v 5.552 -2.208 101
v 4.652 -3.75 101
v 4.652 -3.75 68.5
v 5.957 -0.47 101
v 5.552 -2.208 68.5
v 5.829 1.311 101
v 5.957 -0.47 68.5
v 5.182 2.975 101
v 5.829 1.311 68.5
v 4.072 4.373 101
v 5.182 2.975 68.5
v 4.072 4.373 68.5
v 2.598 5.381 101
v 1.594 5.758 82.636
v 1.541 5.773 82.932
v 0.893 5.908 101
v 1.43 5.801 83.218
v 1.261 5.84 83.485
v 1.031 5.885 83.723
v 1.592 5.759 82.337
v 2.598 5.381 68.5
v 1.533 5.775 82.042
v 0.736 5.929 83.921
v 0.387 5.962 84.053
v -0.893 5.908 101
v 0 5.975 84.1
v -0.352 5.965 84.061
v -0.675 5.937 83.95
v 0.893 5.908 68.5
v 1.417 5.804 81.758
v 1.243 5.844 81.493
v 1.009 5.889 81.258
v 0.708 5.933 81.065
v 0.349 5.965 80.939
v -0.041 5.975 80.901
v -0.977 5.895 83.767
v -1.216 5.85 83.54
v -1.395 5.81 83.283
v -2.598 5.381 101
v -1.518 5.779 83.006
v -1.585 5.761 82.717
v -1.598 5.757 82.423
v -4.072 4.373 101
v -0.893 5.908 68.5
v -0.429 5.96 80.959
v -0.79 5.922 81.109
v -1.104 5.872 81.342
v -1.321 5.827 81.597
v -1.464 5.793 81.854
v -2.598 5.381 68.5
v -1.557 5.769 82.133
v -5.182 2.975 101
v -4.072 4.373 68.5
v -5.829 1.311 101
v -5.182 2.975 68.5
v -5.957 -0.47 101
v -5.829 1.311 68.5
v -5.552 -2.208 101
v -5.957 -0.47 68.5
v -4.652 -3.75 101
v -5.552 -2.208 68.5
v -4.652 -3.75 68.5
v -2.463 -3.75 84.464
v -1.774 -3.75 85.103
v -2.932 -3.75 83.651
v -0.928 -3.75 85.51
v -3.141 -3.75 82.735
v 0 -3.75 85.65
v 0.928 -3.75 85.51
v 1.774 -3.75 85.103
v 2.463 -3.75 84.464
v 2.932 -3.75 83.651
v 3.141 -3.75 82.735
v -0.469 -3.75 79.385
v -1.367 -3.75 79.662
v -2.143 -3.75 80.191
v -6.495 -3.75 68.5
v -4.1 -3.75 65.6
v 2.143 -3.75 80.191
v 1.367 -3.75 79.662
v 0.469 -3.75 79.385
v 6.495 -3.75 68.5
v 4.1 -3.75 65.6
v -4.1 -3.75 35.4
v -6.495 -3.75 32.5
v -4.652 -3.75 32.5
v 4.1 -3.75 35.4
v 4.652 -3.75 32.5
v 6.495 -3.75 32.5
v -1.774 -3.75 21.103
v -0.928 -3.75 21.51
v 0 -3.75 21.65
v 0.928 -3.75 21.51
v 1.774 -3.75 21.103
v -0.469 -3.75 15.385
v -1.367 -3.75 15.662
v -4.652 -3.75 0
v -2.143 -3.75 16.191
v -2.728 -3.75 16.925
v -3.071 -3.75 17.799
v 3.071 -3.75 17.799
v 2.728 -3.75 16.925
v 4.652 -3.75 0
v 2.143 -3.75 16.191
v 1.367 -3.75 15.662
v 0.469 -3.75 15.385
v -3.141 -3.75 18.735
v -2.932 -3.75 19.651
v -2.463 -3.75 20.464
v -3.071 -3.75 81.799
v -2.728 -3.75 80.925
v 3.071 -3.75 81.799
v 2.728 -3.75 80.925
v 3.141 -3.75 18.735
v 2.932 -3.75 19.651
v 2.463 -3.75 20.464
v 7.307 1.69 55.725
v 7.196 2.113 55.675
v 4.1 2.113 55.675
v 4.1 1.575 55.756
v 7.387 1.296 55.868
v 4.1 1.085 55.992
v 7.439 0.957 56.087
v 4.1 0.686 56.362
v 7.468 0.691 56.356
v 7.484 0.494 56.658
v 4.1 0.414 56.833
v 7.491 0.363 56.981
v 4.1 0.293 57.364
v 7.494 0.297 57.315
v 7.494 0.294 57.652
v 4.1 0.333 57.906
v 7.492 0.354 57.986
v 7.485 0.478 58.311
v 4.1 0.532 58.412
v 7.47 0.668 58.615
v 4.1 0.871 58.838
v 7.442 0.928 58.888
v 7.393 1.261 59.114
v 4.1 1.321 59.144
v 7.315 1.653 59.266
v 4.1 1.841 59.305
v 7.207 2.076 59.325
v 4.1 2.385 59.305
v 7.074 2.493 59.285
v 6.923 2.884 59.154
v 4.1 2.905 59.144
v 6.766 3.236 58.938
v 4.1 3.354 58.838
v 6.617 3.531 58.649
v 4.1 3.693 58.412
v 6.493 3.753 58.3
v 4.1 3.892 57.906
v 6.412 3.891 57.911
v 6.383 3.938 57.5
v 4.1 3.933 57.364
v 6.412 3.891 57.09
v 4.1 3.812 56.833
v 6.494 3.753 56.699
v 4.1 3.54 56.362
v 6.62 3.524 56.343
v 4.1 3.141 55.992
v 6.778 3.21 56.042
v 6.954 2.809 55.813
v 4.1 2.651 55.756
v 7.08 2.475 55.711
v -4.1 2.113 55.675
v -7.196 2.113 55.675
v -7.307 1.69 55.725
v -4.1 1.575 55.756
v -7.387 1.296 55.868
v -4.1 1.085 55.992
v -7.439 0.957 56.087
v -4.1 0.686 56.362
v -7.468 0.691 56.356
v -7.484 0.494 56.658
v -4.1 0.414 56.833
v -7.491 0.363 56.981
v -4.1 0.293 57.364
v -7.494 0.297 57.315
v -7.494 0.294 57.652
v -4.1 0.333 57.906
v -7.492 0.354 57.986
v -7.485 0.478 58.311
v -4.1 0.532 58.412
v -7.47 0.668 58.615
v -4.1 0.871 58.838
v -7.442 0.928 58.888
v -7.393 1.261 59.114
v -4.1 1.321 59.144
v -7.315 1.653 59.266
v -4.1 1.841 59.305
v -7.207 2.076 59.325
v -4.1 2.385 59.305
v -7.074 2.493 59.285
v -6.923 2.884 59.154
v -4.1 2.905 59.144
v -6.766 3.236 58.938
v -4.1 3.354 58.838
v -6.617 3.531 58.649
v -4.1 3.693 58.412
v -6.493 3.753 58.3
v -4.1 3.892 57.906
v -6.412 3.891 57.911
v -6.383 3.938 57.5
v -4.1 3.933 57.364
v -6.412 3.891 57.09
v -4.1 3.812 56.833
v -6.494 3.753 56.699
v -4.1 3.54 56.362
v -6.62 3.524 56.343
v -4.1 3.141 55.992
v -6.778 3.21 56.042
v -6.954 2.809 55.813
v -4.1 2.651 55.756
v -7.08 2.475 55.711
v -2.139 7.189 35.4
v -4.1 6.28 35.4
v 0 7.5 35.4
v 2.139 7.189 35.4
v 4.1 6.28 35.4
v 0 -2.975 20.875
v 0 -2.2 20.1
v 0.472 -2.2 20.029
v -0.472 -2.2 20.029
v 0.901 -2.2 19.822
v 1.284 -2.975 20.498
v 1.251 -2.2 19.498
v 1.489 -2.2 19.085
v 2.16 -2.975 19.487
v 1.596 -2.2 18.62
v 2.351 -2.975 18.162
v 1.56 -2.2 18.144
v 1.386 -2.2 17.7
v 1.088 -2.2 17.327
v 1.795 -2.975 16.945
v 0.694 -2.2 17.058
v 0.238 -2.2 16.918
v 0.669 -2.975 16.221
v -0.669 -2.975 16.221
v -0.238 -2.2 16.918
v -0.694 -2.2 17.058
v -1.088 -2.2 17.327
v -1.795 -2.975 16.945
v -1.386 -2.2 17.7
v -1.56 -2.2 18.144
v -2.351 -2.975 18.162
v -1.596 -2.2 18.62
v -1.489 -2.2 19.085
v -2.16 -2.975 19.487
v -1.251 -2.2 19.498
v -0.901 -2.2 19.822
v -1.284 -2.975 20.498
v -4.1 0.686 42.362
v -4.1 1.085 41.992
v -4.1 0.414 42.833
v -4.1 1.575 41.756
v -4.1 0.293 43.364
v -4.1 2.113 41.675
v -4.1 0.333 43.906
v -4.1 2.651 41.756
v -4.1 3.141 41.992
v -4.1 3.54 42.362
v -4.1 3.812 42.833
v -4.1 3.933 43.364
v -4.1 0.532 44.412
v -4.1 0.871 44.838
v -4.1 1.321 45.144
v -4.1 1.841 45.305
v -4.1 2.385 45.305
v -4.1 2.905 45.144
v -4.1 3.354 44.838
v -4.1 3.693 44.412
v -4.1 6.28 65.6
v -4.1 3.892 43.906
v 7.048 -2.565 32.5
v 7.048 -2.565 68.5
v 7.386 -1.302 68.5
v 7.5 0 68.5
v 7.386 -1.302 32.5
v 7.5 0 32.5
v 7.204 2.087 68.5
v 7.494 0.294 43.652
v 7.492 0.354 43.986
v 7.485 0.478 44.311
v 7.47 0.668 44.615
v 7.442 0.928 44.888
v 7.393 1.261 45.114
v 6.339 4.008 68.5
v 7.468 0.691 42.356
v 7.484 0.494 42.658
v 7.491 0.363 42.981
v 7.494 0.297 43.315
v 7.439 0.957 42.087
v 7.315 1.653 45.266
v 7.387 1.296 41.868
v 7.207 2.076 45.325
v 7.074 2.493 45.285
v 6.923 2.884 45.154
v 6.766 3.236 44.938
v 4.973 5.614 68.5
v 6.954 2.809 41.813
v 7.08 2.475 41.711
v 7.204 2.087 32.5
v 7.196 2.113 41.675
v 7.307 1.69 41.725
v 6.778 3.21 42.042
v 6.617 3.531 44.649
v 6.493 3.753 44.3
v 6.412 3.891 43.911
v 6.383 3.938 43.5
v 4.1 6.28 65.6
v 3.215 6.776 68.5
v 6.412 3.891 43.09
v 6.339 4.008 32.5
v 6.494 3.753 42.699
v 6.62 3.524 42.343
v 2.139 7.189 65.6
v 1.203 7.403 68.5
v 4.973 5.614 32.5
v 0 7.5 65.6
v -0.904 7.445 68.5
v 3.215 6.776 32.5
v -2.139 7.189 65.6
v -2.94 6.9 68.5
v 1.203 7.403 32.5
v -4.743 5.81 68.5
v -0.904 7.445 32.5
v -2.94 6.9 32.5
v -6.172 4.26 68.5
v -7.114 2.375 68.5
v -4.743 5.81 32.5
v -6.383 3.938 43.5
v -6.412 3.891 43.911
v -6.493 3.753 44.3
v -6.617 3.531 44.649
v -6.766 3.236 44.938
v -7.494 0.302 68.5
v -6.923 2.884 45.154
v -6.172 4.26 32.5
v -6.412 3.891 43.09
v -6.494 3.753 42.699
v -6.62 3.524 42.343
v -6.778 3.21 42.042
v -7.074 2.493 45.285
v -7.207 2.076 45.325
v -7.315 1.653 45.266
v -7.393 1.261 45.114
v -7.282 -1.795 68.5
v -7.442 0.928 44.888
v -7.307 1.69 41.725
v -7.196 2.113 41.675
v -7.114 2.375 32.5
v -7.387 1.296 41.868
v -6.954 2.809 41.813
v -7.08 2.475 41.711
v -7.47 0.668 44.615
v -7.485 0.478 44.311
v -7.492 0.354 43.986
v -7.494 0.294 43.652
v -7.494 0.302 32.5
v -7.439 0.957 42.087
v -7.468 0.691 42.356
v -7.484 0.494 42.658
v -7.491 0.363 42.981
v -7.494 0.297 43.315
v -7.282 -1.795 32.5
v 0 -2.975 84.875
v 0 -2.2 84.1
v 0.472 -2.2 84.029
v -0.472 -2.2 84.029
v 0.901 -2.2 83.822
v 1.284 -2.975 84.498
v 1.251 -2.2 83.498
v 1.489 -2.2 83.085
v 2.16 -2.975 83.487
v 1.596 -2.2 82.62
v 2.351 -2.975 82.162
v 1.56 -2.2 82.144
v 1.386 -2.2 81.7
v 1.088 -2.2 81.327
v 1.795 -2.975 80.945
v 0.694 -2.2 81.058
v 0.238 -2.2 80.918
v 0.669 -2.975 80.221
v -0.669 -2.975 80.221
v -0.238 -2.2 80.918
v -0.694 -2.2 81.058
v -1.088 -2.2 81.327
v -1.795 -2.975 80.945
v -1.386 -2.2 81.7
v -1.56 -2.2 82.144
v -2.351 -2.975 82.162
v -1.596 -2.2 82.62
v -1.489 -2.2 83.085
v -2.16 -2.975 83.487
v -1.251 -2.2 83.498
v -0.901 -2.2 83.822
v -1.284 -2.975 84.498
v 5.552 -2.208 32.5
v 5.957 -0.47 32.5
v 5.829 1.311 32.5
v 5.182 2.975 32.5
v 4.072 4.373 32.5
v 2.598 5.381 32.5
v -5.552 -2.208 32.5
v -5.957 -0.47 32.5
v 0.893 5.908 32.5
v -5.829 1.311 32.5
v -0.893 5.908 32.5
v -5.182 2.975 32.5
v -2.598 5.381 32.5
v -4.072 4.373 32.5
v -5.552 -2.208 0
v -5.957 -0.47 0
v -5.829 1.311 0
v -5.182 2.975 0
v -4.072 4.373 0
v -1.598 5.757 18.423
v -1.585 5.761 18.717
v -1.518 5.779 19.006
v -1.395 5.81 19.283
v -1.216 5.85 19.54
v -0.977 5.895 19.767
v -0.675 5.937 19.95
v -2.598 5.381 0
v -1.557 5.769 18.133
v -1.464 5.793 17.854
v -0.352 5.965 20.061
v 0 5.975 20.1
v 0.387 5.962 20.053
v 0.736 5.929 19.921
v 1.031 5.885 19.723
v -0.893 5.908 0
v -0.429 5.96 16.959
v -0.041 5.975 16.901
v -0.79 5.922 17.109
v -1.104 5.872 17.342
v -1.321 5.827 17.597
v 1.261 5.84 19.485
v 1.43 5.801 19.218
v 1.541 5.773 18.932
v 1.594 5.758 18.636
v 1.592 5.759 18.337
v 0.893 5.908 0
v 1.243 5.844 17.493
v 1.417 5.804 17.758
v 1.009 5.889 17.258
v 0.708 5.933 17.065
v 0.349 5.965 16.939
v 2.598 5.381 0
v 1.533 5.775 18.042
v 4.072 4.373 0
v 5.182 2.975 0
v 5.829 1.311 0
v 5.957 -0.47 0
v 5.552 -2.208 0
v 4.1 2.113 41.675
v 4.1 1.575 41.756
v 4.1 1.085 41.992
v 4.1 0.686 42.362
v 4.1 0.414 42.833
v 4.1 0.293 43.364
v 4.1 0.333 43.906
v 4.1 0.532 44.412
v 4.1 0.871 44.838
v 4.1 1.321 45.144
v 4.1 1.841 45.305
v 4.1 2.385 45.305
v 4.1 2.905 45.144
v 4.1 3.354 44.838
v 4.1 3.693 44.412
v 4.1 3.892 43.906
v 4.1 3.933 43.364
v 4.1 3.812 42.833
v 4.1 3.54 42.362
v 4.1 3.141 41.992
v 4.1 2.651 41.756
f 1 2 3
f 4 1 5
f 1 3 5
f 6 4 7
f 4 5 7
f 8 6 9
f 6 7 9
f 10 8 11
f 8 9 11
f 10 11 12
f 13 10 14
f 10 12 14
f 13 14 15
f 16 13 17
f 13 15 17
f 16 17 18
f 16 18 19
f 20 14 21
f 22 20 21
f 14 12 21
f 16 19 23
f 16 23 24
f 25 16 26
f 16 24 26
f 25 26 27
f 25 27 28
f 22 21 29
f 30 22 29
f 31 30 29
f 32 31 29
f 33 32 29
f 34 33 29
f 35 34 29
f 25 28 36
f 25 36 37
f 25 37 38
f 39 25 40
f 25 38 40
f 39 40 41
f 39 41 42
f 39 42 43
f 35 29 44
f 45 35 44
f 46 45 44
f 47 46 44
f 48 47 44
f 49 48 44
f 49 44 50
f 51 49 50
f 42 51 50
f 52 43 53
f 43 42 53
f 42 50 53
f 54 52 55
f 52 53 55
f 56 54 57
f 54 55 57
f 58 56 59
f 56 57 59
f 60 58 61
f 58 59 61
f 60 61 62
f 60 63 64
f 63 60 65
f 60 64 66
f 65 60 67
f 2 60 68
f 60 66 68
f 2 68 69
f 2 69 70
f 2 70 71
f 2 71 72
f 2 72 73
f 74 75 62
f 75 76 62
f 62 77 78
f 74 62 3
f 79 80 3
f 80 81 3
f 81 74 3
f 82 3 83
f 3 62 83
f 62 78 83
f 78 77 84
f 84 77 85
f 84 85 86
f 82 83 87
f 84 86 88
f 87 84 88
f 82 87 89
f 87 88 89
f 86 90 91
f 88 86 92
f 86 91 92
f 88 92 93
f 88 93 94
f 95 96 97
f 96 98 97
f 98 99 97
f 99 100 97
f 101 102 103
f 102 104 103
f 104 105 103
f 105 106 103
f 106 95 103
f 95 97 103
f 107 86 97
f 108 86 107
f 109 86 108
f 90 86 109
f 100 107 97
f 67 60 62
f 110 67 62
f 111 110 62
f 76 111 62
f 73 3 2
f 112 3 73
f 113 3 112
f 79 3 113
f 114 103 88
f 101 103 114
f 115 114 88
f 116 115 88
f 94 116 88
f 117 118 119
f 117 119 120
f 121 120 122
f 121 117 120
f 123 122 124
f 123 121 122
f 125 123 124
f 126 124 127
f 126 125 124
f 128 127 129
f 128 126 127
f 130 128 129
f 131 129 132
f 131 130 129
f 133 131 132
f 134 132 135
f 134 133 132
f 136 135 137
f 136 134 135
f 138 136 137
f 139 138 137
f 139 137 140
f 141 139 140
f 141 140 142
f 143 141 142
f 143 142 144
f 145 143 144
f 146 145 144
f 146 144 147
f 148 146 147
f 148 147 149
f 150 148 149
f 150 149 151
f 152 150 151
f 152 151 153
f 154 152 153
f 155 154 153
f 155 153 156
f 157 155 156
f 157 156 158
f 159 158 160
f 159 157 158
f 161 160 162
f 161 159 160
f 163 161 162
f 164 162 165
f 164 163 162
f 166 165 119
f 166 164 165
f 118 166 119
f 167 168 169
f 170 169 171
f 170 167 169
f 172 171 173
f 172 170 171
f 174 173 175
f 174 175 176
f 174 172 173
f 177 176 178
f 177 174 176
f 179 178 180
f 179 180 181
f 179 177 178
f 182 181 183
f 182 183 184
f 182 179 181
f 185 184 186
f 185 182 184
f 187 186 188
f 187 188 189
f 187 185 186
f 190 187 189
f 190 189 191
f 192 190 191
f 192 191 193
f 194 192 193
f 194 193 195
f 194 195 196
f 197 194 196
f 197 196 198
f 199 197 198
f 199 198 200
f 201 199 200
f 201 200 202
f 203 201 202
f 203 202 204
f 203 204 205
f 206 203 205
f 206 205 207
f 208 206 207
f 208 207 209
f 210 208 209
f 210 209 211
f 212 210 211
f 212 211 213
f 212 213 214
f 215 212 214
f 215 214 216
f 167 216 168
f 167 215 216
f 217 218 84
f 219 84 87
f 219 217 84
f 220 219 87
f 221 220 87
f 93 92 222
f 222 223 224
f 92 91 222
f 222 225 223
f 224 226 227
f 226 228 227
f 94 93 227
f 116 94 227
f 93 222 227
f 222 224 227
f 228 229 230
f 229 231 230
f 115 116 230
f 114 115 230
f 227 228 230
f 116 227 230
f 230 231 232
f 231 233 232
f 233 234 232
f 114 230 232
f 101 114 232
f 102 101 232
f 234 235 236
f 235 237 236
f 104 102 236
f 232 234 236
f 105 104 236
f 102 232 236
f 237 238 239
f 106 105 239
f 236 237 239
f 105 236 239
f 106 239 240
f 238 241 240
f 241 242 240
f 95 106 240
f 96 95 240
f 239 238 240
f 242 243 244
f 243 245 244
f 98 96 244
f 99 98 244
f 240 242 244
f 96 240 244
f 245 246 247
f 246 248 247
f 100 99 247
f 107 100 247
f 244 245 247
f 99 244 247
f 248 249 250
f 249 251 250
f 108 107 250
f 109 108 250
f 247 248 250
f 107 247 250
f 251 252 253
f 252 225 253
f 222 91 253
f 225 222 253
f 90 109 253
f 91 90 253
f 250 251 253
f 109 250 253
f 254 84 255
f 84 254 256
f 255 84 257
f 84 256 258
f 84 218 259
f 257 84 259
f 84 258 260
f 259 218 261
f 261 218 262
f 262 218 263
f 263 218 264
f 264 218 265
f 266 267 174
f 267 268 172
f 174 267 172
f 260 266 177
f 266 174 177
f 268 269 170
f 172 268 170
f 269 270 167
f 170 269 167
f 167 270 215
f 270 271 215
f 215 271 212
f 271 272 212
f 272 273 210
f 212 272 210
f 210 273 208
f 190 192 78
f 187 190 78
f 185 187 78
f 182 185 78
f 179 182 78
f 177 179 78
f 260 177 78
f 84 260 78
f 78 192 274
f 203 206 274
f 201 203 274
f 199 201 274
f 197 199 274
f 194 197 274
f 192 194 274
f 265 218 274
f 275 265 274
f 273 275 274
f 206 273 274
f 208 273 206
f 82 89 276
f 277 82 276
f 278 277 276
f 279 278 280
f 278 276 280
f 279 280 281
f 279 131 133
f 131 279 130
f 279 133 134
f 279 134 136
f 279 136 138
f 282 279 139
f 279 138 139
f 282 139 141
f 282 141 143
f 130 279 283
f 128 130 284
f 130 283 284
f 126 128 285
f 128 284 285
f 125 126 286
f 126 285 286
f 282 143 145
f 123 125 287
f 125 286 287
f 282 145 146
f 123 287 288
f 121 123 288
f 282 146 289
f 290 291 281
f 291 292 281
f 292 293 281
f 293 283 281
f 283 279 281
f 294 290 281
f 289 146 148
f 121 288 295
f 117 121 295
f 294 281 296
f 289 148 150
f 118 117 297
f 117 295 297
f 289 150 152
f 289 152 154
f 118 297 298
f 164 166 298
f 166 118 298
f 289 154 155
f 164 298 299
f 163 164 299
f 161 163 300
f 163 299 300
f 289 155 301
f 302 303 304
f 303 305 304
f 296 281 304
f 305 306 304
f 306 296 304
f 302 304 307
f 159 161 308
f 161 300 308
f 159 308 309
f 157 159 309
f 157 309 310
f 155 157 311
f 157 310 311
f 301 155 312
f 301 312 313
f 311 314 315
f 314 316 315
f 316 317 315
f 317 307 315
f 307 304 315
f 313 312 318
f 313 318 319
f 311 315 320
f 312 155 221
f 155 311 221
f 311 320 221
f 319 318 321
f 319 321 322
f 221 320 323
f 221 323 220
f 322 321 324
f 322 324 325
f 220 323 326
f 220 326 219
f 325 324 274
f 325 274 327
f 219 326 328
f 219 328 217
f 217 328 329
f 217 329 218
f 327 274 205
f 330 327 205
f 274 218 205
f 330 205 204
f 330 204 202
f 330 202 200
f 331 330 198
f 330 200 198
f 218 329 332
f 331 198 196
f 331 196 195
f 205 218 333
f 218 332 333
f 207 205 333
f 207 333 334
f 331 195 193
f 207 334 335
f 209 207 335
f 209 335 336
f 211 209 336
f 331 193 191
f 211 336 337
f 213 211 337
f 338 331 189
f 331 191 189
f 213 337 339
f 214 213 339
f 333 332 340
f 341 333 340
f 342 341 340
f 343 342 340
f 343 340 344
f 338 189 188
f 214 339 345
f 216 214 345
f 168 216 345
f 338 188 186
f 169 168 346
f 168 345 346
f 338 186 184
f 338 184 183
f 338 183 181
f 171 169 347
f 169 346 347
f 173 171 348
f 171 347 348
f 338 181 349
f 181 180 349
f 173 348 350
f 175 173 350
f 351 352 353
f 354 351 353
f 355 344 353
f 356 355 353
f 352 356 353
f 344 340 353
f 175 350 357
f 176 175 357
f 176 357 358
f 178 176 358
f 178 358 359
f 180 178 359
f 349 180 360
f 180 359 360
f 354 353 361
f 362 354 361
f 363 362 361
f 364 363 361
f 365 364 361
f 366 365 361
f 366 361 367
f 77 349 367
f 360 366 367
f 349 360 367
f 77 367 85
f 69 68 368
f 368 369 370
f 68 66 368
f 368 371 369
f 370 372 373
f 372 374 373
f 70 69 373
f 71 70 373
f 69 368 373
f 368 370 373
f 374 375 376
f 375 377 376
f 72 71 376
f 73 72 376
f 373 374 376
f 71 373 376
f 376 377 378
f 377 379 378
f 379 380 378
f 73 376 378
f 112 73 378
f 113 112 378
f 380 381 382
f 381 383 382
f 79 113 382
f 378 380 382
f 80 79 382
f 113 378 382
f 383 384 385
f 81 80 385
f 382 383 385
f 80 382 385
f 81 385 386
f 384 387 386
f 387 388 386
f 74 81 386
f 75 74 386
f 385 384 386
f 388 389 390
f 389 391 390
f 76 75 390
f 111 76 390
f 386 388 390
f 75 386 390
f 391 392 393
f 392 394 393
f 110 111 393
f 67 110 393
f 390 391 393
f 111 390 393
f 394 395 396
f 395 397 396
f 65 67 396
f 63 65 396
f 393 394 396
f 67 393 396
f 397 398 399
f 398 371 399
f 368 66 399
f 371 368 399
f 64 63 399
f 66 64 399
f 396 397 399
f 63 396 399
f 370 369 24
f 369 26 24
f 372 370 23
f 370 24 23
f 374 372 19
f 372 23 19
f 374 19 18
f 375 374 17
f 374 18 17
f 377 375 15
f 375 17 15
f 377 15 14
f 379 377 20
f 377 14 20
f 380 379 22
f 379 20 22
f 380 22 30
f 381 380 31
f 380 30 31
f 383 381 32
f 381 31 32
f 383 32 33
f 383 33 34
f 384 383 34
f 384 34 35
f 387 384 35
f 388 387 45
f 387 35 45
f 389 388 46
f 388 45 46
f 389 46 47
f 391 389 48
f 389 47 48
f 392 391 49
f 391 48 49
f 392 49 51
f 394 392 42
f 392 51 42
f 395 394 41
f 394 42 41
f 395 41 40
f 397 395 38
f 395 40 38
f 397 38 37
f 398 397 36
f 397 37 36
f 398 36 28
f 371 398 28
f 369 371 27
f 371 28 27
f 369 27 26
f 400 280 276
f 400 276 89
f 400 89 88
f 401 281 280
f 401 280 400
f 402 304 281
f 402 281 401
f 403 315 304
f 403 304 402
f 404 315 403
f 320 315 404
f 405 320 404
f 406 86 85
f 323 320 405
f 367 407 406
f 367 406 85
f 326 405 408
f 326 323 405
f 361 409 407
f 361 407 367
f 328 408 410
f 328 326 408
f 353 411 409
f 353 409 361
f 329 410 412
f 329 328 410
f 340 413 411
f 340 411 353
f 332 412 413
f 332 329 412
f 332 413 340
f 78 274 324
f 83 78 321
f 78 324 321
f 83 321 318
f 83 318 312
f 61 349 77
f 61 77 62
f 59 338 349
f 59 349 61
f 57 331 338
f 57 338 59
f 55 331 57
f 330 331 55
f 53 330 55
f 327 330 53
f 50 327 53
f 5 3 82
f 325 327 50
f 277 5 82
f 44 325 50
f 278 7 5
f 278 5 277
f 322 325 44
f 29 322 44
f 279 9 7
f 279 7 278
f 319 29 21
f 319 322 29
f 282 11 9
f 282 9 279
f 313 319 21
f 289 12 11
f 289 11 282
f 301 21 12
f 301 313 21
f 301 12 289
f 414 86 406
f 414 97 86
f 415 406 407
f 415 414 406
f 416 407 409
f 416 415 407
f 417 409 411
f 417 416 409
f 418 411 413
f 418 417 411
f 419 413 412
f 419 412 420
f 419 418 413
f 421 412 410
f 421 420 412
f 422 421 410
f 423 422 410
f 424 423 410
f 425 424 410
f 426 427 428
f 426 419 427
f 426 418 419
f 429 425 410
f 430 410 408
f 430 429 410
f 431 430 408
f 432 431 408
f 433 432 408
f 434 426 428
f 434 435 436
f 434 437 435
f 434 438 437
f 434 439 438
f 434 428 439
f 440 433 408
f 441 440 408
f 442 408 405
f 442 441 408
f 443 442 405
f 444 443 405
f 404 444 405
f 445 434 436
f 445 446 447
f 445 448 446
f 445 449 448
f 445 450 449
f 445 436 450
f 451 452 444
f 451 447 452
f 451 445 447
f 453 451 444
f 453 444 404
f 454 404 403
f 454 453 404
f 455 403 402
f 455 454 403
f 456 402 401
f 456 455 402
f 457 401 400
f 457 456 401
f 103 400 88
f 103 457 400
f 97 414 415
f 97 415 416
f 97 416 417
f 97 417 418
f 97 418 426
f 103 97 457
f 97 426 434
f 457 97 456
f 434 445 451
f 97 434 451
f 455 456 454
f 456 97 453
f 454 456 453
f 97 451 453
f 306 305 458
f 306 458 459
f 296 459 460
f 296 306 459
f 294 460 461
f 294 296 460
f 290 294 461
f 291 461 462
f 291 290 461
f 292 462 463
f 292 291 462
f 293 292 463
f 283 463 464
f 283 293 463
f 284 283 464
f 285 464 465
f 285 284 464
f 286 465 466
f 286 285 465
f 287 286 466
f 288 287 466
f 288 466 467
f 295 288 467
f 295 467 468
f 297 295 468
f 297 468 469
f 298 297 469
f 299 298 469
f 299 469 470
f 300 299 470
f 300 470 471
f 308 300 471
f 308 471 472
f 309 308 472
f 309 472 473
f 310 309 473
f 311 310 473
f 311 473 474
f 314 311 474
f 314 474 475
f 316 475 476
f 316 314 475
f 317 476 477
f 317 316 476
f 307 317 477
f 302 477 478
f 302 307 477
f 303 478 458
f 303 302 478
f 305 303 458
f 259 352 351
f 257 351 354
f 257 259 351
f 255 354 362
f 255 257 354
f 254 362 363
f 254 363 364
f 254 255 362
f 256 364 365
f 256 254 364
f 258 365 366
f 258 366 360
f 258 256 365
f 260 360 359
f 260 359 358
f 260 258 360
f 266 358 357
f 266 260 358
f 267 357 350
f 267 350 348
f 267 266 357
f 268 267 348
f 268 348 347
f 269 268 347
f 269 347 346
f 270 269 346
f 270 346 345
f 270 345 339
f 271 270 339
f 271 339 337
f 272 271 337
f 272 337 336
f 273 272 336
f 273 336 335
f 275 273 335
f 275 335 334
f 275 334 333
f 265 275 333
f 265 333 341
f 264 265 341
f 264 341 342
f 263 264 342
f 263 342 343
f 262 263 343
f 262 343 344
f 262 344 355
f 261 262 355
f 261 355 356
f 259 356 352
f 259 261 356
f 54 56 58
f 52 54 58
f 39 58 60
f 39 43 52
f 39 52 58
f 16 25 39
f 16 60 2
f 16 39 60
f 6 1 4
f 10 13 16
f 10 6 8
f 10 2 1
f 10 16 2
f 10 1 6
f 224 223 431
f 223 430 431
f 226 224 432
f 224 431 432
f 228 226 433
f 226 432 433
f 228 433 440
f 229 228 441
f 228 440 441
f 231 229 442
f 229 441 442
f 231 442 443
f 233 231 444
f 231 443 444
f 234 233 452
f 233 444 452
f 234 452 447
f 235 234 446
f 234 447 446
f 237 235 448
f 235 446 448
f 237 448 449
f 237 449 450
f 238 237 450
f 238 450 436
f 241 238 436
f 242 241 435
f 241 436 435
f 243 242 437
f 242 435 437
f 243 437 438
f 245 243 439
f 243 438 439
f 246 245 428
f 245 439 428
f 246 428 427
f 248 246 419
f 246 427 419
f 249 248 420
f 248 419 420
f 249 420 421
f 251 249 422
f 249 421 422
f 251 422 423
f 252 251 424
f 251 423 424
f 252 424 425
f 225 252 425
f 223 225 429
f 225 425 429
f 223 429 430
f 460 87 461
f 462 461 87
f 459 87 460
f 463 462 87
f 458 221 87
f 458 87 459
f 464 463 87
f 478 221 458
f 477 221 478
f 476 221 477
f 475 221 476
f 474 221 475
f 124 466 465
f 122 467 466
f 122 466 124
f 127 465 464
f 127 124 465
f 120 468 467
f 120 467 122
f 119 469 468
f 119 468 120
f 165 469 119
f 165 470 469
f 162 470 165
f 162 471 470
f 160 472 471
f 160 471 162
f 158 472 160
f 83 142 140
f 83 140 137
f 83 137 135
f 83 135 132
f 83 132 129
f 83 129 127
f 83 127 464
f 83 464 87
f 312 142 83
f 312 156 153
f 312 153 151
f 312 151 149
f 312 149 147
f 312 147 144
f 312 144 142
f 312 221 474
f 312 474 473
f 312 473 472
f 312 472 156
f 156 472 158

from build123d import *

# Parameters (mm, degrees)
BOSS_EXTRUDE1_DEPTH     = 101
CUT_EXTRUDE1_START      = -32.5
SKETCH3_R               = 7.5
SKETCH3_R_2             = 5.975
CUT_EXTRUDE1_DEPTH      = 32.5
SKETCH4_R               = 7.5
SKETCH4_R_2             = 5.975
CUT_EXTRUDE2_DEPTH      = 32.5
CUT_EXTRUDE3_DEPTH      = 102.900993616
CUT_EXTRUDE3_DEPTH_BACK = 102.900993616
SKETCH5_W               = 8.2
SKETCH5_H               = 30.2
CUT_EXTRUDE4_DEPTH      = 103.382859894
CUT_EXTRUDE4_DEPTH_BACK = 103.382859894
HOLE1_D                 = 3.2
HOLE1_CSINK_D           = 6.3
HOLE1_CSINK_ANGLE       = 90


with BuildPart() as part:
    # Sketch1 → Boss-Extrude1 (new body)
    with BuildSketch(Plane.XY):
        with BuildLine():
            ThreePointArc((7.5, 0), (-1.941142838, 7.244443697), (-6.495190528, -3.75))
            Line((-6.495190528, -3.75), (6.495190528, -3.75))
            ThreePointArc((6.495190528, -3.75), (7.244443697, -1.941142838), (7.5, 0))
        make_face()
    extrude(amount=BOSS_EXTRUDE1_DEPTH)

    # Sketch3 → Cut-Extrude1 (cut)
    with BuildSketch(Plane.XY.offset(101).offset(CUT_EXTRUDE1_START)):
        Circle(SKETCH3_R)
        Circle(SKETCH3_R_2, mode=Mode.SUBTRACT)
    extrude(amount=CUT_EXTRUDE1_DEPTH, mode=Mode.SUBTRACT)

    # Sketch4 → Cut-Extrude2 (cut)
    with BuildSketch(Plane(origin=(0, 0, 0), x_dir=(-1, 0, 0), z_dir=(0, 0, -1))):
        Circle(SKETCH4_R)
        Circle(SKETCH4_R_2, mode=Mode.SUBTRACT)
    extrude(amount=-CUT_EXTRUDE2_DEPTH, mode=Mode.SUBTRACT)

    # Sketch5 → Cut-Extrude3 (cut, two sides: drawn at the far end of the back side and taken through both)
    with BuildSketch(Plane.XZ.offset(3.75).offset(-CUT_EXTRUDE3_DEPTH_BACK)):
        with Locations((0, 50.5)):
            Rectangle(SKETCH5_W, SKETCH5_H)
    extrude(amount=CUT_EXTRUDE3_DEPTH + CUT_EXTRUDE3_DEPTH_BACK, mode=Mode.SUBTRACT)

    # Sketch10 → Cut-Extrude4 (cut, two sides: drawn at the far end of the back side and taken through both)
    with BuildSketch(Plane.ZY.offset(7.5).offset(-CUT_EXTRUDE4_DEPTH_BACK)):
        with BuildLine():
            ThreePointArc((45.325, 2.112742786), (43.5, 3.937742786), (41.675, 2.112742786))
            Line((41.675, 2.112742786), (45.325, 2.112742786))
        make_face()
        with BuildLine():
            Line((45.325, 2.112742786), (41.675, 2.112742786))
            ThreePointArc((41.675, 2.112742786), (43.5, 0.287742786), (45.325, 2.112742786))
        make_face()
        with BuildLine():
            ThreePointArc((59.325, 2.112742786), (57.5, 3.937742786), (55.675, 2.112742786))
            Line((55.675, 2.112742786), (59.325, 2.112742786))
        make_face()
        with BuildLine():
            Line((59.325, 2.112742786), (55.675, 2.112742786))
            ThreePointArc((55.675, 2.112742786), (57.5, 0.287742786), (59.325, 2.112742786))
        make_face()
    extrude(amount=CUT_EXTRUDE4_DEPTH + CUT_EXTRUDE4_DEPTH_BACK, mode=Mode.SUBTRACT)

    # Hole1 (through all)
    with Locations(Plane(origin=(0, -3.75, 82.5), x_dir=(0, 0, -1), z_dir=(0, -1, 0))):
        with Locations((0, 0), (64, 0)):
            CounterSinkHole(HOLE1_D / 2, HOLE1_CSINK_D / 2, counter_sink_angle=HOLE1_CSINK_ANGLE)


solid = part.part
